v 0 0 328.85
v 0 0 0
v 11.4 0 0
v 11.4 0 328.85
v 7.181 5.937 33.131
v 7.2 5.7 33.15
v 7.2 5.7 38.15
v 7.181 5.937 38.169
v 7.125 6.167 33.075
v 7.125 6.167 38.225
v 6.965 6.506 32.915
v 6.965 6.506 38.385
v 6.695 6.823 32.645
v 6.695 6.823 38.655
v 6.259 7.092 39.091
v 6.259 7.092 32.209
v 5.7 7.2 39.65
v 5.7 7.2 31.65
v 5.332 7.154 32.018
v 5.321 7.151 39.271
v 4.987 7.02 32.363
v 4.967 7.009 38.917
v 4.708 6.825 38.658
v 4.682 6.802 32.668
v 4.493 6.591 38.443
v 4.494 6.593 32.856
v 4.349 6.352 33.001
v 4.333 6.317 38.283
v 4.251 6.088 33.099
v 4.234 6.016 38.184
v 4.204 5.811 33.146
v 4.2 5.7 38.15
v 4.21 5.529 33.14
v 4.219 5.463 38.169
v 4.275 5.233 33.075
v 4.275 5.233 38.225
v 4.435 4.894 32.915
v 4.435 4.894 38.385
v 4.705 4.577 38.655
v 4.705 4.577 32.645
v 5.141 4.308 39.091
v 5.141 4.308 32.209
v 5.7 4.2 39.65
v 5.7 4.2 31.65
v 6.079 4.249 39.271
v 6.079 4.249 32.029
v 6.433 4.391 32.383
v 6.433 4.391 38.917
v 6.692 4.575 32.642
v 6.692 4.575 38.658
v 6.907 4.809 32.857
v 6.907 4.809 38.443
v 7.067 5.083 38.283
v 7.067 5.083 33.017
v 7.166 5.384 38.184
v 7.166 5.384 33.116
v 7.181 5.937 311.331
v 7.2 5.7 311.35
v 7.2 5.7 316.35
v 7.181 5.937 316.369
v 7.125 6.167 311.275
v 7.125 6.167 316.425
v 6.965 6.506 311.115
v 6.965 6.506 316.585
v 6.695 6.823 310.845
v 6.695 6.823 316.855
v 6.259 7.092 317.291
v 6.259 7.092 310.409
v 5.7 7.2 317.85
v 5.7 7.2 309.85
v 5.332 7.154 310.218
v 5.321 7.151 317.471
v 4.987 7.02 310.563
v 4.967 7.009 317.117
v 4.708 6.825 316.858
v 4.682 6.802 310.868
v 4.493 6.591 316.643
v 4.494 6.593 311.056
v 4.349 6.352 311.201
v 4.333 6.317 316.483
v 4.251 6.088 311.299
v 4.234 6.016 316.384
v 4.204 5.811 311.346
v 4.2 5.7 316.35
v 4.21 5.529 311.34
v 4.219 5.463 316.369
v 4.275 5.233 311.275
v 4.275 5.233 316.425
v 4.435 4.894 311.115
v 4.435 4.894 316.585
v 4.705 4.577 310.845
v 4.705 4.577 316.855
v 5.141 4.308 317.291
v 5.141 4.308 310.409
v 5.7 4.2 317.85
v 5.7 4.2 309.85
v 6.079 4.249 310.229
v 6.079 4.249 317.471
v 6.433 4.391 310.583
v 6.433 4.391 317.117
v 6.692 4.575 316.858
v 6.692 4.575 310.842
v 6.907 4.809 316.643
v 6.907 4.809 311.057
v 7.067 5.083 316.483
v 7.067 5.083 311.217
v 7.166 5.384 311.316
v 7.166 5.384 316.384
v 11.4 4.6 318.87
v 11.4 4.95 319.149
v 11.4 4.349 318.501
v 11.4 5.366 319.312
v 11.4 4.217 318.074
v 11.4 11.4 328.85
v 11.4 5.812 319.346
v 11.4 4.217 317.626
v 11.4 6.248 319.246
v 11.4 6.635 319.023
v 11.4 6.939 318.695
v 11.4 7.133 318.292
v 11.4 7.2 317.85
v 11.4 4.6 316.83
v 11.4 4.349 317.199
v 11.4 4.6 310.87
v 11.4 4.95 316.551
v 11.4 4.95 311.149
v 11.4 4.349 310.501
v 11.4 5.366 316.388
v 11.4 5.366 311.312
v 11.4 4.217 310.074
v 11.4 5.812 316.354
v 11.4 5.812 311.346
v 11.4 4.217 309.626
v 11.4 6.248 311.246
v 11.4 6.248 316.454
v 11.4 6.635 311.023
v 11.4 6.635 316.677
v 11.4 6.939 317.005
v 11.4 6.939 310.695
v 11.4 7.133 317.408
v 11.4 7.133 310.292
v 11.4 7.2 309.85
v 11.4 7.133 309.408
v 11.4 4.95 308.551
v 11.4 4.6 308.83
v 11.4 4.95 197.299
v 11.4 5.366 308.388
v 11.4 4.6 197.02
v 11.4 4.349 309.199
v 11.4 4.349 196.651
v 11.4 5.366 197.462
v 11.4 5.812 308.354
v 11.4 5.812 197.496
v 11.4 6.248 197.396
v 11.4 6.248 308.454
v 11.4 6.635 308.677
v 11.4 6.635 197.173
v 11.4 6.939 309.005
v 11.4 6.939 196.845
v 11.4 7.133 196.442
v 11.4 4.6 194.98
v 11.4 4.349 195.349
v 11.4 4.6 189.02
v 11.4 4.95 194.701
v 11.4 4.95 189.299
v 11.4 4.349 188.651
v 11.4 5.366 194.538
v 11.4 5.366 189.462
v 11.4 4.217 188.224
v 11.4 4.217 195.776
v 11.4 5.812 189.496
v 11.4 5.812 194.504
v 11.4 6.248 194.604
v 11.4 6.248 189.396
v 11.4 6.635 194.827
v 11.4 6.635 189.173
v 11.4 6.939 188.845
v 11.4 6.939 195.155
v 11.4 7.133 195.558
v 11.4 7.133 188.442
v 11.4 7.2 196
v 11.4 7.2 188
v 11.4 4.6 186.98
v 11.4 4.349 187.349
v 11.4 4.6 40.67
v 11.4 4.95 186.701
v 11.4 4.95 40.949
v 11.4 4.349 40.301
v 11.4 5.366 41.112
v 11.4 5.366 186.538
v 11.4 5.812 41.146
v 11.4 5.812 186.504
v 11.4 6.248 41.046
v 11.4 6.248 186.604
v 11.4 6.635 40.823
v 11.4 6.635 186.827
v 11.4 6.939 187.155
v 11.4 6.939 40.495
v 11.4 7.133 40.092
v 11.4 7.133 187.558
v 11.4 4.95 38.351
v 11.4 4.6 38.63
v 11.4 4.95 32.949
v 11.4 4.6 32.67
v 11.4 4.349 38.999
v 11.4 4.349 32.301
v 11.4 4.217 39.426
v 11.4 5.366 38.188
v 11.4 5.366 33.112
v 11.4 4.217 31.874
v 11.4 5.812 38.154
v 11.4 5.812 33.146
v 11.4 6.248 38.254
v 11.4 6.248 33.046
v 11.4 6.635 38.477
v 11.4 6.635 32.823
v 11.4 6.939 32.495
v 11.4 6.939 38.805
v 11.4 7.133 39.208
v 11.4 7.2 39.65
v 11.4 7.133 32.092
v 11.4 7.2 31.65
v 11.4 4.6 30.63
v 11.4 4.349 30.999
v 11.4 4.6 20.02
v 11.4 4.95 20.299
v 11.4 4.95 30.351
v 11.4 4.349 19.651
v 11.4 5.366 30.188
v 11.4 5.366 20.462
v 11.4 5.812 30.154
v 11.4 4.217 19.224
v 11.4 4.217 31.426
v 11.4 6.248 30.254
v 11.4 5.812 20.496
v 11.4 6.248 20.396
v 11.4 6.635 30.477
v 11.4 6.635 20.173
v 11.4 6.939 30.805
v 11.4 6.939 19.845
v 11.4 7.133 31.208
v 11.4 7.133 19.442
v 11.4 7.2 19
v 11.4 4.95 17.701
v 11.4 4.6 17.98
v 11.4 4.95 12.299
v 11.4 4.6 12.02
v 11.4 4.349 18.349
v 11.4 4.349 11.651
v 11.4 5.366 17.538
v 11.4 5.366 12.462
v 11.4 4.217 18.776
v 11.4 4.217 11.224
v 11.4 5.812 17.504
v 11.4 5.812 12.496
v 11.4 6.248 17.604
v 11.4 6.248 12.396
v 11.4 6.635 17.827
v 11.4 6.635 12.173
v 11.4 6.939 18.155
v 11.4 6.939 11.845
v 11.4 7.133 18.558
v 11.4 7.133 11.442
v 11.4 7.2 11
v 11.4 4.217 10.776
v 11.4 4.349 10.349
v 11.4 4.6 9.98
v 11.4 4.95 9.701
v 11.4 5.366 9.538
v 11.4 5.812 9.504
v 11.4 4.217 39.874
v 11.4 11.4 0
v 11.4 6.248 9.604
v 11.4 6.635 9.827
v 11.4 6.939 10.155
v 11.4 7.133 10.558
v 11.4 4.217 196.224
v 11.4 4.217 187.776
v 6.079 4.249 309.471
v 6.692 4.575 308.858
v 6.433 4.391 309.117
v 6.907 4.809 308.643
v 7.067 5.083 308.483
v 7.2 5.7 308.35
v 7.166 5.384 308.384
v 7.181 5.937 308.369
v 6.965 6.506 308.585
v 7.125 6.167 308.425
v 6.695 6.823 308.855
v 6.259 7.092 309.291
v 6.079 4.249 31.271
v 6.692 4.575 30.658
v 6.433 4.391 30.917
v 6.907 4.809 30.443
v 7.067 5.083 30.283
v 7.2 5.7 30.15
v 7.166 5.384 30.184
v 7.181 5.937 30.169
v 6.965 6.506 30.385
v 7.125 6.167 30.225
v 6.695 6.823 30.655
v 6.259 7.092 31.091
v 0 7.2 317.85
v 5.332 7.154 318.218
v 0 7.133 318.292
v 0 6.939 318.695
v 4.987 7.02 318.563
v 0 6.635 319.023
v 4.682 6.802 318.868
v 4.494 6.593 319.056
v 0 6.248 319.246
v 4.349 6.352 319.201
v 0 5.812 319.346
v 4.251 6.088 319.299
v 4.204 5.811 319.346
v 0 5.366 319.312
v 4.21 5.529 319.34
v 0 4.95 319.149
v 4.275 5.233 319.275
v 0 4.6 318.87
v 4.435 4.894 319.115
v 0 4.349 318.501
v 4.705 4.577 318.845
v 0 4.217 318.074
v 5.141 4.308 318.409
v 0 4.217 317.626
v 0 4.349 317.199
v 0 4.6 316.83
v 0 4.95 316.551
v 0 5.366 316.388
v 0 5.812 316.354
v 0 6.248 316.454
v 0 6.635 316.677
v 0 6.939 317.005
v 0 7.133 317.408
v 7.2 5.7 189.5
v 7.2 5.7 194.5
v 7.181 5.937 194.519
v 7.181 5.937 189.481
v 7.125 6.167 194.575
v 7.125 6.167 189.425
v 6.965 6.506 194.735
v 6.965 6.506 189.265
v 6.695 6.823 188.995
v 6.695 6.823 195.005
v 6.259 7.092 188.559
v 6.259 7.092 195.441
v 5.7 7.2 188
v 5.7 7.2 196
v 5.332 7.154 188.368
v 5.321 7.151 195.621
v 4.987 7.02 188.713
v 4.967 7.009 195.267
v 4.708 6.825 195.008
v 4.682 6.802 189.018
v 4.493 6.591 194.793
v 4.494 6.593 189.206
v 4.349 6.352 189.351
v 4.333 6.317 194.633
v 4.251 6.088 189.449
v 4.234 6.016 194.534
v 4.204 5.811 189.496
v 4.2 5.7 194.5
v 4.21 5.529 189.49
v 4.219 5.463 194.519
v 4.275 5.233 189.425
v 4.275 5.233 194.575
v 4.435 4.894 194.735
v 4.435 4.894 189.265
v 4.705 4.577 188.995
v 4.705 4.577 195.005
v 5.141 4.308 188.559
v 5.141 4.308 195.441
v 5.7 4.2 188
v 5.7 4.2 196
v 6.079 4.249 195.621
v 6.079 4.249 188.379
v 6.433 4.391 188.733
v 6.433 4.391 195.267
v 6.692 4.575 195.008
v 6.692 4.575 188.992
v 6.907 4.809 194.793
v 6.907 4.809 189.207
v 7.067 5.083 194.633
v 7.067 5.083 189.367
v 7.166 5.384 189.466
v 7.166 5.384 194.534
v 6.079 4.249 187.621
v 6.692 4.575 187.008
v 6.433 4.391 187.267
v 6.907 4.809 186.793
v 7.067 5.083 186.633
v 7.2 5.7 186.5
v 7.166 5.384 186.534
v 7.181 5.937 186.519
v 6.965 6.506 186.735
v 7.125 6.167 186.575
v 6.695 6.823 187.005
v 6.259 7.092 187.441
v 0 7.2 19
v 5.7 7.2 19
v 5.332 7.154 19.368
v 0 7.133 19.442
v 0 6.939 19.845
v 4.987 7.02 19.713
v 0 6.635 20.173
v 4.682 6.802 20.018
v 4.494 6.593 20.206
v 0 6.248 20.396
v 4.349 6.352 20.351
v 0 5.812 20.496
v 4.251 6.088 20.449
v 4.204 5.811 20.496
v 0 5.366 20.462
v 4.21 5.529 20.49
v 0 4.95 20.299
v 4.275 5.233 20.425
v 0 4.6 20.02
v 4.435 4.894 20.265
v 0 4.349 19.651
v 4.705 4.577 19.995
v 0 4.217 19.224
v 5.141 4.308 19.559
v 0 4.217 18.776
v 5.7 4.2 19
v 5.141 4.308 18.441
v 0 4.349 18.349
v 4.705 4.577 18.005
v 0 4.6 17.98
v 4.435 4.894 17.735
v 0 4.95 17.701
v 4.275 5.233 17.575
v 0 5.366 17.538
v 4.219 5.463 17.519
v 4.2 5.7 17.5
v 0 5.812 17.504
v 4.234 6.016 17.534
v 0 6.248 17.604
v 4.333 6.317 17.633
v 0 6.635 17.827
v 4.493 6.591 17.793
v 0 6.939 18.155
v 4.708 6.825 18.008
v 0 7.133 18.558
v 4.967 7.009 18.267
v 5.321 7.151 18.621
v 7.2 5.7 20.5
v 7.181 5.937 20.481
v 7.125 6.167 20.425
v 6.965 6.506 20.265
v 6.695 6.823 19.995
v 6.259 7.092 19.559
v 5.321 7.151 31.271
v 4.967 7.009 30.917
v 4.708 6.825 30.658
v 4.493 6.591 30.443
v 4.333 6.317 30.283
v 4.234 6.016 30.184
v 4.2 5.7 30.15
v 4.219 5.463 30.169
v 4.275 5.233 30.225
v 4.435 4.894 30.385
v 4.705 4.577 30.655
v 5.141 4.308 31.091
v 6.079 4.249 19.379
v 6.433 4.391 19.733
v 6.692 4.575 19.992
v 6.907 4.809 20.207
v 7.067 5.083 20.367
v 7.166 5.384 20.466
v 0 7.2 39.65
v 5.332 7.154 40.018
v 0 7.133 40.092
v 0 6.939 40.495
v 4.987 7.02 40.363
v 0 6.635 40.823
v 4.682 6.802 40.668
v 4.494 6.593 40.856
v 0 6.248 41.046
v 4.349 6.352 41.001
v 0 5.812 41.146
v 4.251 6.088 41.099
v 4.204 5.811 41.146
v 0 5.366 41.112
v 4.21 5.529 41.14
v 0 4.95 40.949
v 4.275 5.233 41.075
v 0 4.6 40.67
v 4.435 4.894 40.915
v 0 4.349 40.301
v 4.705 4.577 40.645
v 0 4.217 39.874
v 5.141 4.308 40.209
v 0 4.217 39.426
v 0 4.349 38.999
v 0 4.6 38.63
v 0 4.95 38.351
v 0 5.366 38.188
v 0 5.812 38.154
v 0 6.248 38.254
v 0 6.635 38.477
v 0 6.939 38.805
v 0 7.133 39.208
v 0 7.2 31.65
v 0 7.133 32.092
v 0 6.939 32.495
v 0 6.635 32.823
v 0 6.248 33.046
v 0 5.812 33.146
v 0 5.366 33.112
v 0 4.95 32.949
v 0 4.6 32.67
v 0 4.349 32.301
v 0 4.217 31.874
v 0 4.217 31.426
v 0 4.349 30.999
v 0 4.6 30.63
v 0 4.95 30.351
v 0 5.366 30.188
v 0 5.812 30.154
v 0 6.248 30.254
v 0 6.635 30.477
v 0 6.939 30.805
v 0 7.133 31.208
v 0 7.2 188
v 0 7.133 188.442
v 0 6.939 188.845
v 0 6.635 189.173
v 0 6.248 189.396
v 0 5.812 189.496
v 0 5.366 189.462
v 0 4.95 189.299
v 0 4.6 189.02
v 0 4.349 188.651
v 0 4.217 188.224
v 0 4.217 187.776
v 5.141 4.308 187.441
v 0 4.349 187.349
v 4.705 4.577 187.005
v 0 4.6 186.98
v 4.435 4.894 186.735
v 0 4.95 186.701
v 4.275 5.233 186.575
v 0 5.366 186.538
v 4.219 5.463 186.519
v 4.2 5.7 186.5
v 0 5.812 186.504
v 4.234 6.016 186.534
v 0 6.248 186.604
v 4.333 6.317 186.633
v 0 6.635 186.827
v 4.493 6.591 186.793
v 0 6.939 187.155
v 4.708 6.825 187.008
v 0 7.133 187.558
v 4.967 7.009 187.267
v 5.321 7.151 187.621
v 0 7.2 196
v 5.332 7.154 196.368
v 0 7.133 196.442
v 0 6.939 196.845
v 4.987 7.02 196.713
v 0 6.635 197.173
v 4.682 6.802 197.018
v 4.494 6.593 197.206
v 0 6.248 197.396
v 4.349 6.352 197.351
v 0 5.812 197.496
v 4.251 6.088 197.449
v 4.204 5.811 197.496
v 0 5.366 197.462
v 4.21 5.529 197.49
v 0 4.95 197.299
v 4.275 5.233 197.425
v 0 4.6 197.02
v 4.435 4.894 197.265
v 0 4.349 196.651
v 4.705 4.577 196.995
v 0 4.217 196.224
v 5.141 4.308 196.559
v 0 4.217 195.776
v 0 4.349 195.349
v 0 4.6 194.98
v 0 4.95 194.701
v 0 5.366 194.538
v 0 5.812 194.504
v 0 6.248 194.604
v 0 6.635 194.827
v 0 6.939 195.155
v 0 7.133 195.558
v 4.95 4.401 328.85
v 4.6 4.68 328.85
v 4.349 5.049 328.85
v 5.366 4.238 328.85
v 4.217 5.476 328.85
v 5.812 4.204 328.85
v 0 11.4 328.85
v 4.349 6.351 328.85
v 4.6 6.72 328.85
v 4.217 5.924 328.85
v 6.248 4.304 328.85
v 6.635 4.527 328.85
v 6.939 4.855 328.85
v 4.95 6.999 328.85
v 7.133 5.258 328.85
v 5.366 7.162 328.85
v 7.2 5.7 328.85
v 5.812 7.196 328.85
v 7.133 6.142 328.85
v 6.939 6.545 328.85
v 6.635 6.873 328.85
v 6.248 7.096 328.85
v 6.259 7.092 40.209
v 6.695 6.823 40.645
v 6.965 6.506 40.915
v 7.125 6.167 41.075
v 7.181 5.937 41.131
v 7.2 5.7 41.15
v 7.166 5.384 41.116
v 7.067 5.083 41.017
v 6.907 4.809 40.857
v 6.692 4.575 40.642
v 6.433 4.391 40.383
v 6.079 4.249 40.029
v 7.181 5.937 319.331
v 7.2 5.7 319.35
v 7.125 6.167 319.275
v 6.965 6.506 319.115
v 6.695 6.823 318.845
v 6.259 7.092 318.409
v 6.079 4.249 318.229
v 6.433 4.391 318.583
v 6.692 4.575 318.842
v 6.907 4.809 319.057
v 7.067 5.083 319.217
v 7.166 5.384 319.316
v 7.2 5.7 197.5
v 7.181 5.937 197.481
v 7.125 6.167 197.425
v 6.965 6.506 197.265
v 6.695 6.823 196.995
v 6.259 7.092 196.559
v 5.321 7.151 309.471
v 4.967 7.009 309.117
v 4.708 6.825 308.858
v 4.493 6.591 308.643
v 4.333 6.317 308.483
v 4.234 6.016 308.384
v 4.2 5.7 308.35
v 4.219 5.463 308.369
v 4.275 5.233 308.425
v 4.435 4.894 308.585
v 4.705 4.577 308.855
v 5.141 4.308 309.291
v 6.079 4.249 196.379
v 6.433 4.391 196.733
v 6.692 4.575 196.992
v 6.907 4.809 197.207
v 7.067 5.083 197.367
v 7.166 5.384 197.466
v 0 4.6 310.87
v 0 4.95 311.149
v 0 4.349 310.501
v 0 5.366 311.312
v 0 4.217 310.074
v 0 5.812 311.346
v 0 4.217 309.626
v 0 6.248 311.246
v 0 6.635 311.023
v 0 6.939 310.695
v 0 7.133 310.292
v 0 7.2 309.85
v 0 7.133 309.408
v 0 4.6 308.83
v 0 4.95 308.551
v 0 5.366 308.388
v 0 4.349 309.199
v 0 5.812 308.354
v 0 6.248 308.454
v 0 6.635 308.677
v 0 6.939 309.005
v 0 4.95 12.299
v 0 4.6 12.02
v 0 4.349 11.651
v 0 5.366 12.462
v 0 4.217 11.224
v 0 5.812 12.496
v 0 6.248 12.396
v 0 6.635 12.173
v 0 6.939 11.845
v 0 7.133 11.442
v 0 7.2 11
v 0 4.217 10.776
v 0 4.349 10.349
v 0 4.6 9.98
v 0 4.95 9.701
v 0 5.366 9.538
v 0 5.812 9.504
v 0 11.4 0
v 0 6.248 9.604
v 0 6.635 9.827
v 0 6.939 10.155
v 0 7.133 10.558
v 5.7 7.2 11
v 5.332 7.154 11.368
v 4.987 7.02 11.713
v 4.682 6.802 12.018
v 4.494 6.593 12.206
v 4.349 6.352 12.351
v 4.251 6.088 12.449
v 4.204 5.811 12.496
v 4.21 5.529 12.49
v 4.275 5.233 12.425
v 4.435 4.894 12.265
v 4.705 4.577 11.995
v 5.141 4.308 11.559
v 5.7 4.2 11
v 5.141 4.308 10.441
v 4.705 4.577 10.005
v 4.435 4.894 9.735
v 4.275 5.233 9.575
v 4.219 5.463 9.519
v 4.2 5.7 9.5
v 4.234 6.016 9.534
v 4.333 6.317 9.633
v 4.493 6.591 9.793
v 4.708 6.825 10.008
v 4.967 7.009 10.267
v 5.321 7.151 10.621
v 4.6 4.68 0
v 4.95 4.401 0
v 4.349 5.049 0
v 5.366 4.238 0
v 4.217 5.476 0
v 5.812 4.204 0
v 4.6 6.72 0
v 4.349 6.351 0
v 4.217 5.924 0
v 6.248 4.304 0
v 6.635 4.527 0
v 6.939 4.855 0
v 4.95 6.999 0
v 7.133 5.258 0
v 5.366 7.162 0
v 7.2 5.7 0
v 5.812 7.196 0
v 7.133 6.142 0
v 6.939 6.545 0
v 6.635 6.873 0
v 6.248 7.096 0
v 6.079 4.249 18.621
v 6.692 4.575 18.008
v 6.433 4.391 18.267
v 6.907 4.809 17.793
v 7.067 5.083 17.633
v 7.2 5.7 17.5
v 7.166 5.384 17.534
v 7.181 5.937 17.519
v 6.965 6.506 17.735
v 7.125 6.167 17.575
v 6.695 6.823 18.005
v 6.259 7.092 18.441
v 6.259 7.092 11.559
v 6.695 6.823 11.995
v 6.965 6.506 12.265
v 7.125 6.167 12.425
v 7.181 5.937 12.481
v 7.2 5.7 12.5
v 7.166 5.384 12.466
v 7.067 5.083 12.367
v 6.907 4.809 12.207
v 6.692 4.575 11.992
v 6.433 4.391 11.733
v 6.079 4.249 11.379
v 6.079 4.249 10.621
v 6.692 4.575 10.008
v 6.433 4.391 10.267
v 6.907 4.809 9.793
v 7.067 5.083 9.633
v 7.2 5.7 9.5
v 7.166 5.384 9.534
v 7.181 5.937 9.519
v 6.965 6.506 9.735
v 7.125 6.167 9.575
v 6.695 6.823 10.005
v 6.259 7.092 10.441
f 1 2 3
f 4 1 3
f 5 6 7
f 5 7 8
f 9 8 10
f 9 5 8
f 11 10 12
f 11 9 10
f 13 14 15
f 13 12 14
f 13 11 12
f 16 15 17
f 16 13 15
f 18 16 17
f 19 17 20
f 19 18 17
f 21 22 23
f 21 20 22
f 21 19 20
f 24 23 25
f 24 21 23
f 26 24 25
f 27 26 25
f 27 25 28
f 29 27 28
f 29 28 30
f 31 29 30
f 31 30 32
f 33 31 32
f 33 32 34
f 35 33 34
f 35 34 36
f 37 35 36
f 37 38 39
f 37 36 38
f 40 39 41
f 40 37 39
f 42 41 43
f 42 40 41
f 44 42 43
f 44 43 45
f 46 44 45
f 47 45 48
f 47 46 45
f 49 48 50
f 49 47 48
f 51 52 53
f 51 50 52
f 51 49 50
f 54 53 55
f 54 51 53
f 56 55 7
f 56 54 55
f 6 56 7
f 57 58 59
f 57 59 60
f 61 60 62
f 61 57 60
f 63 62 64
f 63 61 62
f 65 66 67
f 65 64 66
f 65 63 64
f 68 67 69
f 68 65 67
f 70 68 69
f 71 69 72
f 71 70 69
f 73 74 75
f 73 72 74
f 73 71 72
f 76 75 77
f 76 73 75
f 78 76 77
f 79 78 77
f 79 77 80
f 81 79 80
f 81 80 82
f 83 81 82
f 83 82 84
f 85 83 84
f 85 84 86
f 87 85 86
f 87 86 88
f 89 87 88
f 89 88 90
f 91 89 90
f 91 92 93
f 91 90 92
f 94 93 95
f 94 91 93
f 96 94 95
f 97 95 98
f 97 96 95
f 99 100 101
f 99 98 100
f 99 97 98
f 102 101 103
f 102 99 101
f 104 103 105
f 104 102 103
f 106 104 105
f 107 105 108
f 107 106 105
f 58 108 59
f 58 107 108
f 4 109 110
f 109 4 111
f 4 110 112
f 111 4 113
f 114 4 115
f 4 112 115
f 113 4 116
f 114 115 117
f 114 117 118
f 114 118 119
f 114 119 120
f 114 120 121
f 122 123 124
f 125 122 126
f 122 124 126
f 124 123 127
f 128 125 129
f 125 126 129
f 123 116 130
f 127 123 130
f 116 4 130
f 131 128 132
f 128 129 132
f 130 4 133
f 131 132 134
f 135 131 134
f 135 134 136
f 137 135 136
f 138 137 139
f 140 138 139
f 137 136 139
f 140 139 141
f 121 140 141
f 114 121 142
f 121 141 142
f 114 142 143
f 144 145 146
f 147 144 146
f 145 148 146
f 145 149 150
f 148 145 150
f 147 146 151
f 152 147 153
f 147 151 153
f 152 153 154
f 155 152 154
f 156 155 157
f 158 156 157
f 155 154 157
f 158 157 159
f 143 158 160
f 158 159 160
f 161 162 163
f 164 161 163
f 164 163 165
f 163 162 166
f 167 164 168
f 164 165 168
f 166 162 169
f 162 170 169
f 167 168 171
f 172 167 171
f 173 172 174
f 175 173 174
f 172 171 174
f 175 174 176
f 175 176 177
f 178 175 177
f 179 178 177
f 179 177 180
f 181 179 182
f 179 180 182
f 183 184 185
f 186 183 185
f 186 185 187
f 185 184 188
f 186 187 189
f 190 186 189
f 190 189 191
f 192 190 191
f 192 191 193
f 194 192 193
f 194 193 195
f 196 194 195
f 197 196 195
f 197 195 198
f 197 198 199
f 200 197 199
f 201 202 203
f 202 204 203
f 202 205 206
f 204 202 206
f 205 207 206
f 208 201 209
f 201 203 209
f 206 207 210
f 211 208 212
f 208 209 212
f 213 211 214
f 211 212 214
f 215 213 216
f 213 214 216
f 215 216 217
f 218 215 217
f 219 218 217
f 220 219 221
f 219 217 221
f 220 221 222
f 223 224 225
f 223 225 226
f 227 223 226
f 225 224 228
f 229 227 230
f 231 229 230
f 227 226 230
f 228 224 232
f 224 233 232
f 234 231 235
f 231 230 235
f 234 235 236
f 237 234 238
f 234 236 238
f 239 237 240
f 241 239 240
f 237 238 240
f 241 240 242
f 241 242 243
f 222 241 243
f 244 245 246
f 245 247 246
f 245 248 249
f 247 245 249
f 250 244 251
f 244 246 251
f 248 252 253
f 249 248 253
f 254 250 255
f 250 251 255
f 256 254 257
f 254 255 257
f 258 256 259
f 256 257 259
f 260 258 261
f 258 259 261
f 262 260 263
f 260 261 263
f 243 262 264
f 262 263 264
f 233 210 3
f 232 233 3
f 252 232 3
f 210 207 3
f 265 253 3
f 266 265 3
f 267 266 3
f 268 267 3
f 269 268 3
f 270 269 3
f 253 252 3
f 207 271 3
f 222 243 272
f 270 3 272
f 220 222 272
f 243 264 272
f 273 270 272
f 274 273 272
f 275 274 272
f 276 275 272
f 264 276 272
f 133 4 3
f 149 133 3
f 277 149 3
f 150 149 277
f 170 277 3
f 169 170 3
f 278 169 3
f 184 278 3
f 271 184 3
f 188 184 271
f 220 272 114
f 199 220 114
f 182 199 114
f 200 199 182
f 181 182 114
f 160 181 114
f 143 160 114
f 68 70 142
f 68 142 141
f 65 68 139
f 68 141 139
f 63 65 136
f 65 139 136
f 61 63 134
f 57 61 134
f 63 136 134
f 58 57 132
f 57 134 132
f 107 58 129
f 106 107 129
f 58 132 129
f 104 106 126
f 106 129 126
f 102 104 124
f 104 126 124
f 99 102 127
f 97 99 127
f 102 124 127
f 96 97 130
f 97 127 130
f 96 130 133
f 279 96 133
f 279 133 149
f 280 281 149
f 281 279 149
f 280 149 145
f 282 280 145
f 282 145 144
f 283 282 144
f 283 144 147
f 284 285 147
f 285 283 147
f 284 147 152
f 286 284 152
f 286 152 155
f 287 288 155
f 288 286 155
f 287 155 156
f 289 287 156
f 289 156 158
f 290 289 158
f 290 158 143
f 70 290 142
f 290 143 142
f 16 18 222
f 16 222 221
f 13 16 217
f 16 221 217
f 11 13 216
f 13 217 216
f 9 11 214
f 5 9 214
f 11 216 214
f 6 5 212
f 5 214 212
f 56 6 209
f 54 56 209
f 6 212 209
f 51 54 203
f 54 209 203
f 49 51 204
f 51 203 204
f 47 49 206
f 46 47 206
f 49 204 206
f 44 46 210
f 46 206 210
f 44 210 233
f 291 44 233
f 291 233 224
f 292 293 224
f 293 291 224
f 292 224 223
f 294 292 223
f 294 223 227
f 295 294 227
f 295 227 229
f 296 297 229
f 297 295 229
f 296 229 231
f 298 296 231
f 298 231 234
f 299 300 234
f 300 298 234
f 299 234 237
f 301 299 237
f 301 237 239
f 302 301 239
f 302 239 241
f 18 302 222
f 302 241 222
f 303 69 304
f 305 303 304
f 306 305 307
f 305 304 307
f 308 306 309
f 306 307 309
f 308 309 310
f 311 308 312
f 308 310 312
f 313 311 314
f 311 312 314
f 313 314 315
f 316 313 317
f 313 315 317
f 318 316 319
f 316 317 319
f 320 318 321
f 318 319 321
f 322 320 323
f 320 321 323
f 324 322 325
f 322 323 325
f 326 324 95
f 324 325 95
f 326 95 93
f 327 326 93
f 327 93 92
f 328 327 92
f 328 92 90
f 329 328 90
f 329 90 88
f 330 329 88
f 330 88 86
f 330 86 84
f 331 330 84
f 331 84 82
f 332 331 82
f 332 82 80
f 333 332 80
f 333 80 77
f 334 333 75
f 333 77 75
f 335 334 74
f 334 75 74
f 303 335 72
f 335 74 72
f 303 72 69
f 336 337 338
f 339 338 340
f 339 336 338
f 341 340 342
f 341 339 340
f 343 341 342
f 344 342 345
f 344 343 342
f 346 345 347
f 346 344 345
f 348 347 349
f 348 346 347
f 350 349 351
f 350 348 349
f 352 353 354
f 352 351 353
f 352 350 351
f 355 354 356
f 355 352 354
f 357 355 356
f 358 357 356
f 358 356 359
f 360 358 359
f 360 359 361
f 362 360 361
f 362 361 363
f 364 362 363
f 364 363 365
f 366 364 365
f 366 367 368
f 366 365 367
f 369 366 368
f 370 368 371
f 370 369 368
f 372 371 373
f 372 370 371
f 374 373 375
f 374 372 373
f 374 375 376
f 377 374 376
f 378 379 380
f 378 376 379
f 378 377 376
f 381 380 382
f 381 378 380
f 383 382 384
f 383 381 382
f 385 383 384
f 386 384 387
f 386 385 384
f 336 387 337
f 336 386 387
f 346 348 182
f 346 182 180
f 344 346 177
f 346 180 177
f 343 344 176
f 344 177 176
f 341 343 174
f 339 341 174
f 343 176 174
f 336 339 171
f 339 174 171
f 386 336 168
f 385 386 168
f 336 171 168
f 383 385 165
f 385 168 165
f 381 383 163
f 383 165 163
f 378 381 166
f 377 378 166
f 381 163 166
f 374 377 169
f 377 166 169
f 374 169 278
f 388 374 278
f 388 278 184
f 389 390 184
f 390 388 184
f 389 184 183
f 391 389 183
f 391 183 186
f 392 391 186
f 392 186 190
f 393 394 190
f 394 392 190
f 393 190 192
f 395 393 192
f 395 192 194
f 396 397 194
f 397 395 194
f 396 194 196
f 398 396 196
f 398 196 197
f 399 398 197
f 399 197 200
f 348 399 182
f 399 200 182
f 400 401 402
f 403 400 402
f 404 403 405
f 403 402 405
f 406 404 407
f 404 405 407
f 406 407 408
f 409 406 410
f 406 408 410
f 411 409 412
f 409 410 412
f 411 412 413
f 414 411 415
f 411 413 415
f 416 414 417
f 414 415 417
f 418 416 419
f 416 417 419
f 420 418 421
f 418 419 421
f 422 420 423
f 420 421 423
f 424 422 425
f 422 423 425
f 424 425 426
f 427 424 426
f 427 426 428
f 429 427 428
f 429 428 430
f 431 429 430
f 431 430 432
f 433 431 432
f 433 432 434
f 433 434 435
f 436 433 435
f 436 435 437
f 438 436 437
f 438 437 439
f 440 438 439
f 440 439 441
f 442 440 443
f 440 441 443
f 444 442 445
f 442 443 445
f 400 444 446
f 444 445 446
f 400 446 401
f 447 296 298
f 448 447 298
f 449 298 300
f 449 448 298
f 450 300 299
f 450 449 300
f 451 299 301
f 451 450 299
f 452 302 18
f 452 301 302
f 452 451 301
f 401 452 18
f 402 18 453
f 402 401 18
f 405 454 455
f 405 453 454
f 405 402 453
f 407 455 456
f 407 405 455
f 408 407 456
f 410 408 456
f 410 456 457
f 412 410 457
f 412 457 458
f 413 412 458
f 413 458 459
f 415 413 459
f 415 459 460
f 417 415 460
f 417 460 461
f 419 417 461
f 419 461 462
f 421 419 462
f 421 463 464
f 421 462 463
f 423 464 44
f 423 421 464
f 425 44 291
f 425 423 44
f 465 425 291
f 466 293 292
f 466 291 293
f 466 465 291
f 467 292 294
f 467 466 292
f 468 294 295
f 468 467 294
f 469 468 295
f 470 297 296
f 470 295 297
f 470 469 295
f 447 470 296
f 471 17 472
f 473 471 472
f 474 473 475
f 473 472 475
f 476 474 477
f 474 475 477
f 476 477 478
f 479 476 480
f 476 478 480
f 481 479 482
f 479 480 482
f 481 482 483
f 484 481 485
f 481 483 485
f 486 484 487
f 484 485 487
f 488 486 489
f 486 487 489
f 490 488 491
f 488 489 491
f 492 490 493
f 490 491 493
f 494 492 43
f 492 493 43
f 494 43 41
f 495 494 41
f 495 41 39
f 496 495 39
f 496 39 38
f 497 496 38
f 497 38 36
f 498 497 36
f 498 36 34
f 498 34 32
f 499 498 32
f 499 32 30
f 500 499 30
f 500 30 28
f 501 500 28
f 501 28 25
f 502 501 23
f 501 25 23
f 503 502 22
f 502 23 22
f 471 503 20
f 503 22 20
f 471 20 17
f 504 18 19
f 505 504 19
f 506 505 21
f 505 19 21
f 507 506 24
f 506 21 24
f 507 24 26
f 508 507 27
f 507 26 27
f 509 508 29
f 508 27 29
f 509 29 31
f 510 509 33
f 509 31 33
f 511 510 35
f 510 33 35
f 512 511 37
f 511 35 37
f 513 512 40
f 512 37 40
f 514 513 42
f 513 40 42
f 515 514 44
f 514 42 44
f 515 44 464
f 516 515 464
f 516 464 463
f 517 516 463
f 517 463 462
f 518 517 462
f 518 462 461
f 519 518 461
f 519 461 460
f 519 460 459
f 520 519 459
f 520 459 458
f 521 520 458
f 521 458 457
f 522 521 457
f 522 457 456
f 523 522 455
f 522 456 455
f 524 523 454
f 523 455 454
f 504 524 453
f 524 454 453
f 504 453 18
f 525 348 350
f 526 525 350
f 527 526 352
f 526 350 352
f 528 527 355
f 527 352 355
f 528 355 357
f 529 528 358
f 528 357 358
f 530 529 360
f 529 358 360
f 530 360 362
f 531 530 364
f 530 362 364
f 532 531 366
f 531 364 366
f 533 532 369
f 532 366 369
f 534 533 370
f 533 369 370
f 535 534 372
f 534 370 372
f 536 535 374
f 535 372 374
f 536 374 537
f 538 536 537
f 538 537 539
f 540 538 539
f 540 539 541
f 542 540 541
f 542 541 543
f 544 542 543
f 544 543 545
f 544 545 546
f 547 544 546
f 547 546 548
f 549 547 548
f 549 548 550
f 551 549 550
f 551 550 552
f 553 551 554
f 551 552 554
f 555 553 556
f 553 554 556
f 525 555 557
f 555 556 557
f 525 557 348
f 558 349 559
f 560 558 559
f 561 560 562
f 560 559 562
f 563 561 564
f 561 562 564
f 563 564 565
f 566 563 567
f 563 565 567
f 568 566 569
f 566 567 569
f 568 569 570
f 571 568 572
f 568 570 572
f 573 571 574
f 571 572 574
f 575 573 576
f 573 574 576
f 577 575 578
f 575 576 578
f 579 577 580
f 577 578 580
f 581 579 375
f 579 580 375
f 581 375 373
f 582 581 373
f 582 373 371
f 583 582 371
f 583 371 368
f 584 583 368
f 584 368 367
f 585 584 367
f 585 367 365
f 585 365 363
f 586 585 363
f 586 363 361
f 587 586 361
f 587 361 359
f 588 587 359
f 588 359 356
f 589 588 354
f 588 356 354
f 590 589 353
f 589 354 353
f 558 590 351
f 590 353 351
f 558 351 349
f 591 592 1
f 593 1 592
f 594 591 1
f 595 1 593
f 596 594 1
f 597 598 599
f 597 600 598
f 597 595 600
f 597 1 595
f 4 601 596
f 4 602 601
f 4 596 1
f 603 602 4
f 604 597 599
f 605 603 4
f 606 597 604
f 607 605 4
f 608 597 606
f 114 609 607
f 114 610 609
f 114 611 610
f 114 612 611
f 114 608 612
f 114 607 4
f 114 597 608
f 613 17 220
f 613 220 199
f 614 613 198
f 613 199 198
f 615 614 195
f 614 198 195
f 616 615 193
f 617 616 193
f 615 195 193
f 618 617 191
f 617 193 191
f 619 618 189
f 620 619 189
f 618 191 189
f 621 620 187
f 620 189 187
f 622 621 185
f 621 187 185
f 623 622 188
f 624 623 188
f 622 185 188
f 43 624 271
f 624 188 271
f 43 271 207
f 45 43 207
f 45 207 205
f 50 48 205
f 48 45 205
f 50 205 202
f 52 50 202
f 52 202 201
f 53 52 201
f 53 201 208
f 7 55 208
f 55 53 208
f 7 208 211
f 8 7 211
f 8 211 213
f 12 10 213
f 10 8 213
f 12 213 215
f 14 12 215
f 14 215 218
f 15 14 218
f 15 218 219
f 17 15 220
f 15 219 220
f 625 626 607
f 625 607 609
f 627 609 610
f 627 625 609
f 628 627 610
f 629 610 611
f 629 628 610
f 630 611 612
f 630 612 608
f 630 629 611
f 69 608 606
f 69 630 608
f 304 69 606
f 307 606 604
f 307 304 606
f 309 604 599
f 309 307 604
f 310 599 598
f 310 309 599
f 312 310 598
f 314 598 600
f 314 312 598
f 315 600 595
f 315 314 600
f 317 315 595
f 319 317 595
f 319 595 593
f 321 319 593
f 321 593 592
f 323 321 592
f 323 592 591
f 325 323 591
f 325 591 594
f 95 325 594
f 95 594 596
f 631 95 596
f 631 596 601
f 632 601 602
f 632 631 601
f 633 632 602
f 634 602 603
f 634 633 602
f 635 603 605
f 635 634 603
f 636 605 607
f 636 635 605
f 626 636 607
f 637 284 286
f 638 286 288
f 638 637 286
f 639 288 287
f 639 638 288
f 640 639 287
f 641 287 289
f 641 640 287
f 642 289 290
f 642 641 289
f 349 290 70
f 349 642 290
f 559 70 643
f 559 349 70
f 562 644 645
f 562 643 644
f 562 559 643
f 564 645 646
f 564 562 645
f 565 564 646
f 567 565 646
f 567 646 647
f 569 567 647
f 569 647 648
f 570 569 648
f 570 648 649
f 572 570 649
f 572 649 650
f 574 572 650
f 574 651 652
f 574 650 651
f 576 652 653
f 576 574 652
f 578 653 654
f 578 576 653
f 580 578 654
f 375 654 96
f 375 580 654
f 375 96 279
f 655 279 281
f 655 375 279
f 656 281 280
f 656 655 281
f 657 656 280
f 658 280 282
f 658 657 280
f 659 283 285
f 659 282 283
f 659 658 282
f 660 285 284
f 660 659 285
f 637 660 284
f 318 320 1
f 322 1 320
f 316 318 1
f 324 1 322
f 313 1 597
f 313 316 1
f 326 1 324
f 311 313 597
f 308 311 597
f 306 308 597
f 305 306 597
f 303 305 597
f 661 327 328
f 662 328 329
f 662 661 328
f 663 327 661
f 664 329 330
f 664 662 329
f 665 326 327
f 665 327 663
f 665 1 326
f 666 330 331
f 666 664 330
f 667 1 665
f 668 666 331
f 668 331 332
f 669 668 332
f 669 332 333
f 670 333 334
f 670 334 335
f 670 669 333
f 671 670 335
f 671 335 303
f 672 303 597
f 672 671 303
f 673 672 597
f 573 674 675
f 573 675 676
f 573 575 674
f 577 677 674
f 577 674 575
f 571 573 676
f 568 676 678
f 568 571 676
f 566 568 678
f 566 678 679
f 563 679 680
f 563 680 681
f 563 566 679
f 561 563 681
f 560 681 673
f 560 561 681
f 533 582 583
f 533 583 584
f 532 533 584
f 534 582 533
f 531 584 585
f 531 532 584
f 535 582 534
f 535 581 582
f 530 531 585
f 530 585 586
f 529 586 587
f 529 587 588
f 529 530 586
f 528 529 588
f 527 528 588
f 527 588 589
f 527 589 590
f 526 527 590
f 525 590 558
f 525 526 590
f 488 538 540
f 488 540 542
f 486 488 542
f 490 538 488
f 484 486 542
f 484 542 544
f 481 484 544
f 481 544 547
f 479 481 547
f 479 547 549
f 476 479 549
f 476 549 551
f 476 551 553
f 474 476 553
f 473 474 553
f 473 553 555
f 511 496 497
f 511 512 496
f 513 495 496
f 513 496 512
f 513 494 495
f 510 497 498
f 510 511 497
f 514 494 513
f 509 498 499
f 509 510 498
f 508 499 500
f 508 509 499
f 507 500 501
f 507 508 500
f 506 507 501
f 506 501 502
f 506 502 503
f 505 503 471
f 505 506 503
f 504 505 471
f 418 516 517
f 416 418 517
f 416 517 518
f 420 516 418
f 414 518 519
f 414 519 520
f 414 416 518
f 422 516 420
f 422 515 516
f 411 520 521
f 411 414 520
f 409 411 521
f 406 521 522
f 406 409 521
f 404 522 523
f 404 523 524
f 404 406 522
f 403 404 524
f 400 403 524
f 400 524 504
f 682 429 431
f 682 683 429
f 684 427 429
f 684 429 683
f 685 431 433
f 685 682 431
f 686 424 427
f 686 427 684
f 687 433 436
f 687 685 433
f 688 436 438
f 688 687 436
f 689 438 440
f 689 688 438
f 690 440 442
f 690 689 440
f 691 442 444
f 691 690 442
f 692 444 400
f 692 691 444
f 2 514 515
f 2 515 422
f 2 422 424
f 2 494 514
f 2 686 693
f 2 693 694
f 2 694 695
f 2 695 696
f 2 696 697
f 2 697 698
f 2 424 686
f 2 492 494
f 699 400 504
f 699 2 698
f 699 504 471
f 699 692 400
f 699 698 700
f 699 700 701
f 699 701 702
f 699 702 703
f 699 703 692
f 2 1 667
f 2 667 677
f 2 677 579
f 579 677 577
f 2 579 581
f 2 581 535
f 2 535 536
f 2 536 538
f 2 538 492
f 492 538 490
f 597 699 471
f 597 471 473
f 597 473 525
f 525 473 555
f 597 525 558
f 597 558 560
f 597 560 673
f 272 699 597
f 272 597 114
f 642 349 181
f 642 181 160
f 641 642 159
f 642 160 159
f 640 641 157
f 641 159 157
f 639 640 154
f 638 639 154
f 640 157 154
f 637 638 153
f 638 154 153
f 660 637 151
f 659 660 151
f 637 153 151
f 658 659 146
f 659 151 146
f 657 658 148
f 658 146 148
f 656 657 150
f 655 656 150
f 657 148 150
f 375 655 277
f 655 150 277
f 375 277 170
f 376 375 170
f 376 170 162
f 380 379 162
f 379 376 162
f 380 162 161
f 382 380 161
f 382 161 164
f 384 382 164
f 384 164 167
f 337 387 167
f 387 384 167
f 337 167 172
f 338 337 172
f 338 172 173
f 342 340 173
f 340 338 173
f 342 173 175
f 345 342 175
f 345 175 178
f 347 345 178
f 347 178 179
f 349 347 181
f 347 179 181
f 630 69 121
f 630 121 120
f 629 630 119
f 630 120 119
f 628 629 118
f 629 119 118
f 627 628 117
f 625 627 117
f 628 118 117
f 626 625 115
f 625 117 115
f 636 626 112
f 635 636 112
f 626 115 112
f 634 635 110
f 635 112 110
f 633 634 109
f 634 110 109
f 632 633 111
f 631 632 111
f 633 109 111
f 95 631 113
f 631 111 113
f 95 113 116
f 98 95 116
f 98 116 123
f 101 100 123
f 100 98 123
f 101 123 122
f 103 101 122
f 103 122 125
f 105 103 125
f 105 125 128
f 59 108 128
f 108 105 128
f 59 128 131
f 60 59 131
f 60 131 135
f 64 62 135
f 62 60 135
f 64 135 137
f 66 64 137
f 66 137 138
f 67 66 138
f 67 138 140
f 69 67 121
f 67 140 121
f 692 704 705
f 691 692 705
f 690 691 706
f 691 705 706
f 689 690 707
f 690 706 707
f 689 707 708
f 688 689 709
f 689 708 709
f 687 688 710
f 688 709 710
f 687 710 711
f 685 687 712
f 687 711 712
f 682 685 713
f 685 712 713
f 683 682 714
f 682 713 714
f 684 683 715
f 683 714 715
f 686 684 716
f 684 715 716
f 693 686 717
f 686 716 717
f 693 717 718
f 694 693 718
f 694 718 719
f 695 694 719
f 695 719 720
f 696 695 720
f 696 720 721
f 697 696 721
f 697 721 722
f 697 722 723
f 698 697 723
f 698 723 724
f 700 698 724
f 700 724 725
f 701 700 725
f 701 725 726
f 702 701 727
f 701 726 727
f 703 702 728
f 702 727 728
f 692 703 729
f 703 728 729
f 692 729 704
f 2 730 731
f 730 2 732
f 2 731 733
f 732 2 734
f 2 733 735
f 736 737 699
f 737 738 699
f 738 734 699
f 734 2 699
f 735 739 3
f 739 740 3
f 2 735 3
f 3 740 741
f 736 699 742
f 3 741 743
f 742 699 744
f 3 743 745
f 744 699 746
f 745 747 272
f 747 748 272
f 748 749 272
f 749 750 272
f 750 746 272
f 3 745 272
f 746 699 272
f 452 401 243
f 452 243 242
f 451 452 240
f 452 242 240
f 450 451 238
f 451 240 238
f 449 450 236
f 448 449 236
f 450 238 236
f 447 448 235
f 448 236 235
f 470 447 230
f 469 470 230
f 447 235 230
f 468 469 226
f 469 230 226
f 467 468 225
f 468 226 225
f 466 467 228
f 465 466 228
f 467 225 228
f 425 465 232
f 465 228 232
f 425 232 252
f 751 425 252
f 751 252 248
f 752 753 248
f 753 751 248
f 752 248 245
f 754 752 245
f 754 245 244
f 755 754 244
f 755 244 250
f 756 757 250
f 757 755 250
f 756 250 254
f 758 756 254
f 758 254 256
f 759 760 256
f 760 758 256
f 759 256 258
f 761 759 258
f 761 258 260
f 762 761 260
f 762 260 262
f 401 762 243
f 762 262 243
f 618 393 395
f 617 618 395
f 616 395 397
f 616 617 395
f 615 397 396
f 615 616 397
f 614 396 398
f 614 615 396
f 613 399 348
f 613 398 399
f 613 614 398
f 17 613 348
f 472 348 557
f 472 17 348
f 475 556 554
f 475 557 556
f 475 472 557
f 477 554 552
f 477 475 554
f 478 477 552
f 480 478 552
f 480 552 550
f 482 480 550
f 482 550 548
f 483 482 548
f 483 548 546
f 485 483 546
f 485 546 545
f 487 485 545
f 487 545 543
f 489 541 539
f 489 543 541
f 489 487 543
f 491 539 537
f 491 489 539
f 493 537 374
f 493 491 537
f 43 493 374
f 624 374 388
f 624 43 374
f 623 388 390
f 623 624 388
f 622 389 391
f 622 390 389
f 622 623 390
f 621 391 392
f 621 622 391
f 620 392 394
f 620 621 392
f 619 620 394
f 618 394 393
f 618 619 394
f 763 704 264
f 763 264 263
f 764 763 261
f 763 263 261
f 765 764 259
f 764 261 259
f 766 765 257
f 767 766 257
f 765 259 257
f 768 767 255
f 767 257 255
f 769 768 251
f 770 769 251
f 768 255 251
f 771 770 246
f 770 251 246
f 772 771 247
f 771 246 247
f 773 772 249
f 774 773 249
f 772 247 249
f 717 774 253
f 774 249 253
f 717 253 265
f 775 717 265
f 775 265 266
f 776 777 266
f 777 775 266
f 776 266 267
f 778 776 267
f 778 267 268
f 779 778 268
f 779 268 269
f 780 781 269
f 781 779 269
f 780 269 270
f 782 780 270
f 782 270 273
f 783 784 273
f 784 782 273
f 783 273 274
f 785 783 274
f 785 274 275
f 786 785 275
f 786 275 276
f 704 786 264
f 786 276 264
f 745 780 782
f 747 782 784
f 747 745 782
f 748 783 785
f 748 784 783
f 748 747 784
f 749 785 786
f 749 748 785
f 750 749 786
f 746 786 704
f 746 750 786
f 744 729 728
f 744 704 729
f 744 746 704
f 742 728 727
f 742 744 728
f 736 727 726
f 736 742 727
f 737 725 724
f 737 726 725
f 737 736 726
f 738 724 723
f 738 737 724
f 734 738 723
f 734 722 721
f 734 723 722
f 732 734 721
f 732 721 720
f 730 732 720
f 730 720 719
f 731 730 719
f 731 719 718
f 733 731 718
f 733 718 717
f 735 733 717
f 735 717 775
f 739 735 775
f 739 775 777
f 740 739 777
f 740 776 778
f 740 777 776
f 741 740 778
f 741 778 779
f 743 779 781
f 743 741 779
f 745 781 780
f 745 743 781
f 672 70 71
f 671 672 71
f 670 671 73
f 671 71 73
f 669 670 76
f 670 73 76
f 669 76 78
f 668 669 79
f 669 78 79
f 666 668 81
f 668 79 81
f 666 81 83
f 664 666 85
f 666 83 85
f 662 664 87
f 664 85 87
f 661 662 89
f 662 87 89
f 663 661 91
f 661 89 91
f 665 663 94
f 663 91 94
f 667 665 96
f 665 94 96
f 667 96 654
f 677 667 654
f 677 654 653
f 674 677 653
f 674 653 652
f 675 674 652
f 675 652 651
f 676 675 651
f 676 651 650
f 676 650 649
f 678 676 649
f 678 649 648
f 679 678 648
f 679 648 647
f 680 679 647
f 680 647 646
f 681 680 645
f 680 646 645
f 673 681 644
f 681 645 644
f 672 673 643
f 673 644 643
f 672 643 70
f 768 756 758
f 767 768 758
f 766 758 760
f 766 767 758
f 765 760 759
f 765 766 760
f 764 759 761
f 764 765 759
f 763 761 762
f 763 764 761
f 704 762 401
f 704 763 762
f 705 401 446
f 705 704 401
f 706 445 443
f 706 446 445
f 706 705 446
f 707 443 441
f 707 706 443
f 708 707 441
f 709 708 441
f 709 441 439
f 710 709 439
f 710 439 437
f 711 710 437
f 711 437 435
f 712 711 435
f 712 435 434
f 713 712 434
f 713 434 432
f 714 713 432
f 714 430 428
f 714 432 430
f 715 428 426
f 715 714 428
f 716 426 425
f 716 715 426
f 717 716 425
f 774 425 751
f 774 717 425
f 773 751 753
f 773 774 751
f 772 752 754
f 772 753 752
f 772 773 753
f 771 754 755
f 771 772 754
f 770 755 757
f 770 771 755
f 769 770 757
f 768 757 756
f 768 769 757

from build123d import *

# Parameters (mm, degrees)
SKETCH_W     = 11.4
SKETCH_H     = 11.4
SKETCH_R     = 1.5
PAD_DEPTH    = 328.85
SKETCH001_R  = 1.5
POCKET_DEPTH = 11.401


with BuildPart() as part:
    # Sketch → Pad (new body)
    with BuildSketch(Plane.XY):
        with Locations((5.7, 5.7)):
            Rectangle(SKETCH_W, SKETCH_H)
        with Locations((5.7, 5.7)):
            Circle(SKETCH_R, mode=Mode.SUBTRACT)
    extrude(amount=PAD_DEPTH)

    # Sketch001 → Pocket (cut, through all)
    with BuildSketch(Plane.YZ.offset(11.4)):
        with Locations((5.7, 39.65)):
            Circle(SKETCH001_R)
        with Locations((5.7, 31.65)):
            Circle(SKETCH001_R)
        with Locations((5.7, 19)):
            Circle(SKETCH001_R)
        with Locations((5.7, 11)):
            Circle(SKETCH001_R)
        with Locations((5.7, 196)):
            Circle(SKETCH001_R)
        with Locations((5.7, 188)):
            Circle(SKETCH001_R)
        with Locations((5.7, 317.85)):
            Circle(SKETCH001_R)
        with Locations((5.7, 309.85)):
            Circle(SKETCH001_R)
    extrude(amount=-POCKET_DEPTH, mode=Mode.SUBTRACT)


solid = part.part
